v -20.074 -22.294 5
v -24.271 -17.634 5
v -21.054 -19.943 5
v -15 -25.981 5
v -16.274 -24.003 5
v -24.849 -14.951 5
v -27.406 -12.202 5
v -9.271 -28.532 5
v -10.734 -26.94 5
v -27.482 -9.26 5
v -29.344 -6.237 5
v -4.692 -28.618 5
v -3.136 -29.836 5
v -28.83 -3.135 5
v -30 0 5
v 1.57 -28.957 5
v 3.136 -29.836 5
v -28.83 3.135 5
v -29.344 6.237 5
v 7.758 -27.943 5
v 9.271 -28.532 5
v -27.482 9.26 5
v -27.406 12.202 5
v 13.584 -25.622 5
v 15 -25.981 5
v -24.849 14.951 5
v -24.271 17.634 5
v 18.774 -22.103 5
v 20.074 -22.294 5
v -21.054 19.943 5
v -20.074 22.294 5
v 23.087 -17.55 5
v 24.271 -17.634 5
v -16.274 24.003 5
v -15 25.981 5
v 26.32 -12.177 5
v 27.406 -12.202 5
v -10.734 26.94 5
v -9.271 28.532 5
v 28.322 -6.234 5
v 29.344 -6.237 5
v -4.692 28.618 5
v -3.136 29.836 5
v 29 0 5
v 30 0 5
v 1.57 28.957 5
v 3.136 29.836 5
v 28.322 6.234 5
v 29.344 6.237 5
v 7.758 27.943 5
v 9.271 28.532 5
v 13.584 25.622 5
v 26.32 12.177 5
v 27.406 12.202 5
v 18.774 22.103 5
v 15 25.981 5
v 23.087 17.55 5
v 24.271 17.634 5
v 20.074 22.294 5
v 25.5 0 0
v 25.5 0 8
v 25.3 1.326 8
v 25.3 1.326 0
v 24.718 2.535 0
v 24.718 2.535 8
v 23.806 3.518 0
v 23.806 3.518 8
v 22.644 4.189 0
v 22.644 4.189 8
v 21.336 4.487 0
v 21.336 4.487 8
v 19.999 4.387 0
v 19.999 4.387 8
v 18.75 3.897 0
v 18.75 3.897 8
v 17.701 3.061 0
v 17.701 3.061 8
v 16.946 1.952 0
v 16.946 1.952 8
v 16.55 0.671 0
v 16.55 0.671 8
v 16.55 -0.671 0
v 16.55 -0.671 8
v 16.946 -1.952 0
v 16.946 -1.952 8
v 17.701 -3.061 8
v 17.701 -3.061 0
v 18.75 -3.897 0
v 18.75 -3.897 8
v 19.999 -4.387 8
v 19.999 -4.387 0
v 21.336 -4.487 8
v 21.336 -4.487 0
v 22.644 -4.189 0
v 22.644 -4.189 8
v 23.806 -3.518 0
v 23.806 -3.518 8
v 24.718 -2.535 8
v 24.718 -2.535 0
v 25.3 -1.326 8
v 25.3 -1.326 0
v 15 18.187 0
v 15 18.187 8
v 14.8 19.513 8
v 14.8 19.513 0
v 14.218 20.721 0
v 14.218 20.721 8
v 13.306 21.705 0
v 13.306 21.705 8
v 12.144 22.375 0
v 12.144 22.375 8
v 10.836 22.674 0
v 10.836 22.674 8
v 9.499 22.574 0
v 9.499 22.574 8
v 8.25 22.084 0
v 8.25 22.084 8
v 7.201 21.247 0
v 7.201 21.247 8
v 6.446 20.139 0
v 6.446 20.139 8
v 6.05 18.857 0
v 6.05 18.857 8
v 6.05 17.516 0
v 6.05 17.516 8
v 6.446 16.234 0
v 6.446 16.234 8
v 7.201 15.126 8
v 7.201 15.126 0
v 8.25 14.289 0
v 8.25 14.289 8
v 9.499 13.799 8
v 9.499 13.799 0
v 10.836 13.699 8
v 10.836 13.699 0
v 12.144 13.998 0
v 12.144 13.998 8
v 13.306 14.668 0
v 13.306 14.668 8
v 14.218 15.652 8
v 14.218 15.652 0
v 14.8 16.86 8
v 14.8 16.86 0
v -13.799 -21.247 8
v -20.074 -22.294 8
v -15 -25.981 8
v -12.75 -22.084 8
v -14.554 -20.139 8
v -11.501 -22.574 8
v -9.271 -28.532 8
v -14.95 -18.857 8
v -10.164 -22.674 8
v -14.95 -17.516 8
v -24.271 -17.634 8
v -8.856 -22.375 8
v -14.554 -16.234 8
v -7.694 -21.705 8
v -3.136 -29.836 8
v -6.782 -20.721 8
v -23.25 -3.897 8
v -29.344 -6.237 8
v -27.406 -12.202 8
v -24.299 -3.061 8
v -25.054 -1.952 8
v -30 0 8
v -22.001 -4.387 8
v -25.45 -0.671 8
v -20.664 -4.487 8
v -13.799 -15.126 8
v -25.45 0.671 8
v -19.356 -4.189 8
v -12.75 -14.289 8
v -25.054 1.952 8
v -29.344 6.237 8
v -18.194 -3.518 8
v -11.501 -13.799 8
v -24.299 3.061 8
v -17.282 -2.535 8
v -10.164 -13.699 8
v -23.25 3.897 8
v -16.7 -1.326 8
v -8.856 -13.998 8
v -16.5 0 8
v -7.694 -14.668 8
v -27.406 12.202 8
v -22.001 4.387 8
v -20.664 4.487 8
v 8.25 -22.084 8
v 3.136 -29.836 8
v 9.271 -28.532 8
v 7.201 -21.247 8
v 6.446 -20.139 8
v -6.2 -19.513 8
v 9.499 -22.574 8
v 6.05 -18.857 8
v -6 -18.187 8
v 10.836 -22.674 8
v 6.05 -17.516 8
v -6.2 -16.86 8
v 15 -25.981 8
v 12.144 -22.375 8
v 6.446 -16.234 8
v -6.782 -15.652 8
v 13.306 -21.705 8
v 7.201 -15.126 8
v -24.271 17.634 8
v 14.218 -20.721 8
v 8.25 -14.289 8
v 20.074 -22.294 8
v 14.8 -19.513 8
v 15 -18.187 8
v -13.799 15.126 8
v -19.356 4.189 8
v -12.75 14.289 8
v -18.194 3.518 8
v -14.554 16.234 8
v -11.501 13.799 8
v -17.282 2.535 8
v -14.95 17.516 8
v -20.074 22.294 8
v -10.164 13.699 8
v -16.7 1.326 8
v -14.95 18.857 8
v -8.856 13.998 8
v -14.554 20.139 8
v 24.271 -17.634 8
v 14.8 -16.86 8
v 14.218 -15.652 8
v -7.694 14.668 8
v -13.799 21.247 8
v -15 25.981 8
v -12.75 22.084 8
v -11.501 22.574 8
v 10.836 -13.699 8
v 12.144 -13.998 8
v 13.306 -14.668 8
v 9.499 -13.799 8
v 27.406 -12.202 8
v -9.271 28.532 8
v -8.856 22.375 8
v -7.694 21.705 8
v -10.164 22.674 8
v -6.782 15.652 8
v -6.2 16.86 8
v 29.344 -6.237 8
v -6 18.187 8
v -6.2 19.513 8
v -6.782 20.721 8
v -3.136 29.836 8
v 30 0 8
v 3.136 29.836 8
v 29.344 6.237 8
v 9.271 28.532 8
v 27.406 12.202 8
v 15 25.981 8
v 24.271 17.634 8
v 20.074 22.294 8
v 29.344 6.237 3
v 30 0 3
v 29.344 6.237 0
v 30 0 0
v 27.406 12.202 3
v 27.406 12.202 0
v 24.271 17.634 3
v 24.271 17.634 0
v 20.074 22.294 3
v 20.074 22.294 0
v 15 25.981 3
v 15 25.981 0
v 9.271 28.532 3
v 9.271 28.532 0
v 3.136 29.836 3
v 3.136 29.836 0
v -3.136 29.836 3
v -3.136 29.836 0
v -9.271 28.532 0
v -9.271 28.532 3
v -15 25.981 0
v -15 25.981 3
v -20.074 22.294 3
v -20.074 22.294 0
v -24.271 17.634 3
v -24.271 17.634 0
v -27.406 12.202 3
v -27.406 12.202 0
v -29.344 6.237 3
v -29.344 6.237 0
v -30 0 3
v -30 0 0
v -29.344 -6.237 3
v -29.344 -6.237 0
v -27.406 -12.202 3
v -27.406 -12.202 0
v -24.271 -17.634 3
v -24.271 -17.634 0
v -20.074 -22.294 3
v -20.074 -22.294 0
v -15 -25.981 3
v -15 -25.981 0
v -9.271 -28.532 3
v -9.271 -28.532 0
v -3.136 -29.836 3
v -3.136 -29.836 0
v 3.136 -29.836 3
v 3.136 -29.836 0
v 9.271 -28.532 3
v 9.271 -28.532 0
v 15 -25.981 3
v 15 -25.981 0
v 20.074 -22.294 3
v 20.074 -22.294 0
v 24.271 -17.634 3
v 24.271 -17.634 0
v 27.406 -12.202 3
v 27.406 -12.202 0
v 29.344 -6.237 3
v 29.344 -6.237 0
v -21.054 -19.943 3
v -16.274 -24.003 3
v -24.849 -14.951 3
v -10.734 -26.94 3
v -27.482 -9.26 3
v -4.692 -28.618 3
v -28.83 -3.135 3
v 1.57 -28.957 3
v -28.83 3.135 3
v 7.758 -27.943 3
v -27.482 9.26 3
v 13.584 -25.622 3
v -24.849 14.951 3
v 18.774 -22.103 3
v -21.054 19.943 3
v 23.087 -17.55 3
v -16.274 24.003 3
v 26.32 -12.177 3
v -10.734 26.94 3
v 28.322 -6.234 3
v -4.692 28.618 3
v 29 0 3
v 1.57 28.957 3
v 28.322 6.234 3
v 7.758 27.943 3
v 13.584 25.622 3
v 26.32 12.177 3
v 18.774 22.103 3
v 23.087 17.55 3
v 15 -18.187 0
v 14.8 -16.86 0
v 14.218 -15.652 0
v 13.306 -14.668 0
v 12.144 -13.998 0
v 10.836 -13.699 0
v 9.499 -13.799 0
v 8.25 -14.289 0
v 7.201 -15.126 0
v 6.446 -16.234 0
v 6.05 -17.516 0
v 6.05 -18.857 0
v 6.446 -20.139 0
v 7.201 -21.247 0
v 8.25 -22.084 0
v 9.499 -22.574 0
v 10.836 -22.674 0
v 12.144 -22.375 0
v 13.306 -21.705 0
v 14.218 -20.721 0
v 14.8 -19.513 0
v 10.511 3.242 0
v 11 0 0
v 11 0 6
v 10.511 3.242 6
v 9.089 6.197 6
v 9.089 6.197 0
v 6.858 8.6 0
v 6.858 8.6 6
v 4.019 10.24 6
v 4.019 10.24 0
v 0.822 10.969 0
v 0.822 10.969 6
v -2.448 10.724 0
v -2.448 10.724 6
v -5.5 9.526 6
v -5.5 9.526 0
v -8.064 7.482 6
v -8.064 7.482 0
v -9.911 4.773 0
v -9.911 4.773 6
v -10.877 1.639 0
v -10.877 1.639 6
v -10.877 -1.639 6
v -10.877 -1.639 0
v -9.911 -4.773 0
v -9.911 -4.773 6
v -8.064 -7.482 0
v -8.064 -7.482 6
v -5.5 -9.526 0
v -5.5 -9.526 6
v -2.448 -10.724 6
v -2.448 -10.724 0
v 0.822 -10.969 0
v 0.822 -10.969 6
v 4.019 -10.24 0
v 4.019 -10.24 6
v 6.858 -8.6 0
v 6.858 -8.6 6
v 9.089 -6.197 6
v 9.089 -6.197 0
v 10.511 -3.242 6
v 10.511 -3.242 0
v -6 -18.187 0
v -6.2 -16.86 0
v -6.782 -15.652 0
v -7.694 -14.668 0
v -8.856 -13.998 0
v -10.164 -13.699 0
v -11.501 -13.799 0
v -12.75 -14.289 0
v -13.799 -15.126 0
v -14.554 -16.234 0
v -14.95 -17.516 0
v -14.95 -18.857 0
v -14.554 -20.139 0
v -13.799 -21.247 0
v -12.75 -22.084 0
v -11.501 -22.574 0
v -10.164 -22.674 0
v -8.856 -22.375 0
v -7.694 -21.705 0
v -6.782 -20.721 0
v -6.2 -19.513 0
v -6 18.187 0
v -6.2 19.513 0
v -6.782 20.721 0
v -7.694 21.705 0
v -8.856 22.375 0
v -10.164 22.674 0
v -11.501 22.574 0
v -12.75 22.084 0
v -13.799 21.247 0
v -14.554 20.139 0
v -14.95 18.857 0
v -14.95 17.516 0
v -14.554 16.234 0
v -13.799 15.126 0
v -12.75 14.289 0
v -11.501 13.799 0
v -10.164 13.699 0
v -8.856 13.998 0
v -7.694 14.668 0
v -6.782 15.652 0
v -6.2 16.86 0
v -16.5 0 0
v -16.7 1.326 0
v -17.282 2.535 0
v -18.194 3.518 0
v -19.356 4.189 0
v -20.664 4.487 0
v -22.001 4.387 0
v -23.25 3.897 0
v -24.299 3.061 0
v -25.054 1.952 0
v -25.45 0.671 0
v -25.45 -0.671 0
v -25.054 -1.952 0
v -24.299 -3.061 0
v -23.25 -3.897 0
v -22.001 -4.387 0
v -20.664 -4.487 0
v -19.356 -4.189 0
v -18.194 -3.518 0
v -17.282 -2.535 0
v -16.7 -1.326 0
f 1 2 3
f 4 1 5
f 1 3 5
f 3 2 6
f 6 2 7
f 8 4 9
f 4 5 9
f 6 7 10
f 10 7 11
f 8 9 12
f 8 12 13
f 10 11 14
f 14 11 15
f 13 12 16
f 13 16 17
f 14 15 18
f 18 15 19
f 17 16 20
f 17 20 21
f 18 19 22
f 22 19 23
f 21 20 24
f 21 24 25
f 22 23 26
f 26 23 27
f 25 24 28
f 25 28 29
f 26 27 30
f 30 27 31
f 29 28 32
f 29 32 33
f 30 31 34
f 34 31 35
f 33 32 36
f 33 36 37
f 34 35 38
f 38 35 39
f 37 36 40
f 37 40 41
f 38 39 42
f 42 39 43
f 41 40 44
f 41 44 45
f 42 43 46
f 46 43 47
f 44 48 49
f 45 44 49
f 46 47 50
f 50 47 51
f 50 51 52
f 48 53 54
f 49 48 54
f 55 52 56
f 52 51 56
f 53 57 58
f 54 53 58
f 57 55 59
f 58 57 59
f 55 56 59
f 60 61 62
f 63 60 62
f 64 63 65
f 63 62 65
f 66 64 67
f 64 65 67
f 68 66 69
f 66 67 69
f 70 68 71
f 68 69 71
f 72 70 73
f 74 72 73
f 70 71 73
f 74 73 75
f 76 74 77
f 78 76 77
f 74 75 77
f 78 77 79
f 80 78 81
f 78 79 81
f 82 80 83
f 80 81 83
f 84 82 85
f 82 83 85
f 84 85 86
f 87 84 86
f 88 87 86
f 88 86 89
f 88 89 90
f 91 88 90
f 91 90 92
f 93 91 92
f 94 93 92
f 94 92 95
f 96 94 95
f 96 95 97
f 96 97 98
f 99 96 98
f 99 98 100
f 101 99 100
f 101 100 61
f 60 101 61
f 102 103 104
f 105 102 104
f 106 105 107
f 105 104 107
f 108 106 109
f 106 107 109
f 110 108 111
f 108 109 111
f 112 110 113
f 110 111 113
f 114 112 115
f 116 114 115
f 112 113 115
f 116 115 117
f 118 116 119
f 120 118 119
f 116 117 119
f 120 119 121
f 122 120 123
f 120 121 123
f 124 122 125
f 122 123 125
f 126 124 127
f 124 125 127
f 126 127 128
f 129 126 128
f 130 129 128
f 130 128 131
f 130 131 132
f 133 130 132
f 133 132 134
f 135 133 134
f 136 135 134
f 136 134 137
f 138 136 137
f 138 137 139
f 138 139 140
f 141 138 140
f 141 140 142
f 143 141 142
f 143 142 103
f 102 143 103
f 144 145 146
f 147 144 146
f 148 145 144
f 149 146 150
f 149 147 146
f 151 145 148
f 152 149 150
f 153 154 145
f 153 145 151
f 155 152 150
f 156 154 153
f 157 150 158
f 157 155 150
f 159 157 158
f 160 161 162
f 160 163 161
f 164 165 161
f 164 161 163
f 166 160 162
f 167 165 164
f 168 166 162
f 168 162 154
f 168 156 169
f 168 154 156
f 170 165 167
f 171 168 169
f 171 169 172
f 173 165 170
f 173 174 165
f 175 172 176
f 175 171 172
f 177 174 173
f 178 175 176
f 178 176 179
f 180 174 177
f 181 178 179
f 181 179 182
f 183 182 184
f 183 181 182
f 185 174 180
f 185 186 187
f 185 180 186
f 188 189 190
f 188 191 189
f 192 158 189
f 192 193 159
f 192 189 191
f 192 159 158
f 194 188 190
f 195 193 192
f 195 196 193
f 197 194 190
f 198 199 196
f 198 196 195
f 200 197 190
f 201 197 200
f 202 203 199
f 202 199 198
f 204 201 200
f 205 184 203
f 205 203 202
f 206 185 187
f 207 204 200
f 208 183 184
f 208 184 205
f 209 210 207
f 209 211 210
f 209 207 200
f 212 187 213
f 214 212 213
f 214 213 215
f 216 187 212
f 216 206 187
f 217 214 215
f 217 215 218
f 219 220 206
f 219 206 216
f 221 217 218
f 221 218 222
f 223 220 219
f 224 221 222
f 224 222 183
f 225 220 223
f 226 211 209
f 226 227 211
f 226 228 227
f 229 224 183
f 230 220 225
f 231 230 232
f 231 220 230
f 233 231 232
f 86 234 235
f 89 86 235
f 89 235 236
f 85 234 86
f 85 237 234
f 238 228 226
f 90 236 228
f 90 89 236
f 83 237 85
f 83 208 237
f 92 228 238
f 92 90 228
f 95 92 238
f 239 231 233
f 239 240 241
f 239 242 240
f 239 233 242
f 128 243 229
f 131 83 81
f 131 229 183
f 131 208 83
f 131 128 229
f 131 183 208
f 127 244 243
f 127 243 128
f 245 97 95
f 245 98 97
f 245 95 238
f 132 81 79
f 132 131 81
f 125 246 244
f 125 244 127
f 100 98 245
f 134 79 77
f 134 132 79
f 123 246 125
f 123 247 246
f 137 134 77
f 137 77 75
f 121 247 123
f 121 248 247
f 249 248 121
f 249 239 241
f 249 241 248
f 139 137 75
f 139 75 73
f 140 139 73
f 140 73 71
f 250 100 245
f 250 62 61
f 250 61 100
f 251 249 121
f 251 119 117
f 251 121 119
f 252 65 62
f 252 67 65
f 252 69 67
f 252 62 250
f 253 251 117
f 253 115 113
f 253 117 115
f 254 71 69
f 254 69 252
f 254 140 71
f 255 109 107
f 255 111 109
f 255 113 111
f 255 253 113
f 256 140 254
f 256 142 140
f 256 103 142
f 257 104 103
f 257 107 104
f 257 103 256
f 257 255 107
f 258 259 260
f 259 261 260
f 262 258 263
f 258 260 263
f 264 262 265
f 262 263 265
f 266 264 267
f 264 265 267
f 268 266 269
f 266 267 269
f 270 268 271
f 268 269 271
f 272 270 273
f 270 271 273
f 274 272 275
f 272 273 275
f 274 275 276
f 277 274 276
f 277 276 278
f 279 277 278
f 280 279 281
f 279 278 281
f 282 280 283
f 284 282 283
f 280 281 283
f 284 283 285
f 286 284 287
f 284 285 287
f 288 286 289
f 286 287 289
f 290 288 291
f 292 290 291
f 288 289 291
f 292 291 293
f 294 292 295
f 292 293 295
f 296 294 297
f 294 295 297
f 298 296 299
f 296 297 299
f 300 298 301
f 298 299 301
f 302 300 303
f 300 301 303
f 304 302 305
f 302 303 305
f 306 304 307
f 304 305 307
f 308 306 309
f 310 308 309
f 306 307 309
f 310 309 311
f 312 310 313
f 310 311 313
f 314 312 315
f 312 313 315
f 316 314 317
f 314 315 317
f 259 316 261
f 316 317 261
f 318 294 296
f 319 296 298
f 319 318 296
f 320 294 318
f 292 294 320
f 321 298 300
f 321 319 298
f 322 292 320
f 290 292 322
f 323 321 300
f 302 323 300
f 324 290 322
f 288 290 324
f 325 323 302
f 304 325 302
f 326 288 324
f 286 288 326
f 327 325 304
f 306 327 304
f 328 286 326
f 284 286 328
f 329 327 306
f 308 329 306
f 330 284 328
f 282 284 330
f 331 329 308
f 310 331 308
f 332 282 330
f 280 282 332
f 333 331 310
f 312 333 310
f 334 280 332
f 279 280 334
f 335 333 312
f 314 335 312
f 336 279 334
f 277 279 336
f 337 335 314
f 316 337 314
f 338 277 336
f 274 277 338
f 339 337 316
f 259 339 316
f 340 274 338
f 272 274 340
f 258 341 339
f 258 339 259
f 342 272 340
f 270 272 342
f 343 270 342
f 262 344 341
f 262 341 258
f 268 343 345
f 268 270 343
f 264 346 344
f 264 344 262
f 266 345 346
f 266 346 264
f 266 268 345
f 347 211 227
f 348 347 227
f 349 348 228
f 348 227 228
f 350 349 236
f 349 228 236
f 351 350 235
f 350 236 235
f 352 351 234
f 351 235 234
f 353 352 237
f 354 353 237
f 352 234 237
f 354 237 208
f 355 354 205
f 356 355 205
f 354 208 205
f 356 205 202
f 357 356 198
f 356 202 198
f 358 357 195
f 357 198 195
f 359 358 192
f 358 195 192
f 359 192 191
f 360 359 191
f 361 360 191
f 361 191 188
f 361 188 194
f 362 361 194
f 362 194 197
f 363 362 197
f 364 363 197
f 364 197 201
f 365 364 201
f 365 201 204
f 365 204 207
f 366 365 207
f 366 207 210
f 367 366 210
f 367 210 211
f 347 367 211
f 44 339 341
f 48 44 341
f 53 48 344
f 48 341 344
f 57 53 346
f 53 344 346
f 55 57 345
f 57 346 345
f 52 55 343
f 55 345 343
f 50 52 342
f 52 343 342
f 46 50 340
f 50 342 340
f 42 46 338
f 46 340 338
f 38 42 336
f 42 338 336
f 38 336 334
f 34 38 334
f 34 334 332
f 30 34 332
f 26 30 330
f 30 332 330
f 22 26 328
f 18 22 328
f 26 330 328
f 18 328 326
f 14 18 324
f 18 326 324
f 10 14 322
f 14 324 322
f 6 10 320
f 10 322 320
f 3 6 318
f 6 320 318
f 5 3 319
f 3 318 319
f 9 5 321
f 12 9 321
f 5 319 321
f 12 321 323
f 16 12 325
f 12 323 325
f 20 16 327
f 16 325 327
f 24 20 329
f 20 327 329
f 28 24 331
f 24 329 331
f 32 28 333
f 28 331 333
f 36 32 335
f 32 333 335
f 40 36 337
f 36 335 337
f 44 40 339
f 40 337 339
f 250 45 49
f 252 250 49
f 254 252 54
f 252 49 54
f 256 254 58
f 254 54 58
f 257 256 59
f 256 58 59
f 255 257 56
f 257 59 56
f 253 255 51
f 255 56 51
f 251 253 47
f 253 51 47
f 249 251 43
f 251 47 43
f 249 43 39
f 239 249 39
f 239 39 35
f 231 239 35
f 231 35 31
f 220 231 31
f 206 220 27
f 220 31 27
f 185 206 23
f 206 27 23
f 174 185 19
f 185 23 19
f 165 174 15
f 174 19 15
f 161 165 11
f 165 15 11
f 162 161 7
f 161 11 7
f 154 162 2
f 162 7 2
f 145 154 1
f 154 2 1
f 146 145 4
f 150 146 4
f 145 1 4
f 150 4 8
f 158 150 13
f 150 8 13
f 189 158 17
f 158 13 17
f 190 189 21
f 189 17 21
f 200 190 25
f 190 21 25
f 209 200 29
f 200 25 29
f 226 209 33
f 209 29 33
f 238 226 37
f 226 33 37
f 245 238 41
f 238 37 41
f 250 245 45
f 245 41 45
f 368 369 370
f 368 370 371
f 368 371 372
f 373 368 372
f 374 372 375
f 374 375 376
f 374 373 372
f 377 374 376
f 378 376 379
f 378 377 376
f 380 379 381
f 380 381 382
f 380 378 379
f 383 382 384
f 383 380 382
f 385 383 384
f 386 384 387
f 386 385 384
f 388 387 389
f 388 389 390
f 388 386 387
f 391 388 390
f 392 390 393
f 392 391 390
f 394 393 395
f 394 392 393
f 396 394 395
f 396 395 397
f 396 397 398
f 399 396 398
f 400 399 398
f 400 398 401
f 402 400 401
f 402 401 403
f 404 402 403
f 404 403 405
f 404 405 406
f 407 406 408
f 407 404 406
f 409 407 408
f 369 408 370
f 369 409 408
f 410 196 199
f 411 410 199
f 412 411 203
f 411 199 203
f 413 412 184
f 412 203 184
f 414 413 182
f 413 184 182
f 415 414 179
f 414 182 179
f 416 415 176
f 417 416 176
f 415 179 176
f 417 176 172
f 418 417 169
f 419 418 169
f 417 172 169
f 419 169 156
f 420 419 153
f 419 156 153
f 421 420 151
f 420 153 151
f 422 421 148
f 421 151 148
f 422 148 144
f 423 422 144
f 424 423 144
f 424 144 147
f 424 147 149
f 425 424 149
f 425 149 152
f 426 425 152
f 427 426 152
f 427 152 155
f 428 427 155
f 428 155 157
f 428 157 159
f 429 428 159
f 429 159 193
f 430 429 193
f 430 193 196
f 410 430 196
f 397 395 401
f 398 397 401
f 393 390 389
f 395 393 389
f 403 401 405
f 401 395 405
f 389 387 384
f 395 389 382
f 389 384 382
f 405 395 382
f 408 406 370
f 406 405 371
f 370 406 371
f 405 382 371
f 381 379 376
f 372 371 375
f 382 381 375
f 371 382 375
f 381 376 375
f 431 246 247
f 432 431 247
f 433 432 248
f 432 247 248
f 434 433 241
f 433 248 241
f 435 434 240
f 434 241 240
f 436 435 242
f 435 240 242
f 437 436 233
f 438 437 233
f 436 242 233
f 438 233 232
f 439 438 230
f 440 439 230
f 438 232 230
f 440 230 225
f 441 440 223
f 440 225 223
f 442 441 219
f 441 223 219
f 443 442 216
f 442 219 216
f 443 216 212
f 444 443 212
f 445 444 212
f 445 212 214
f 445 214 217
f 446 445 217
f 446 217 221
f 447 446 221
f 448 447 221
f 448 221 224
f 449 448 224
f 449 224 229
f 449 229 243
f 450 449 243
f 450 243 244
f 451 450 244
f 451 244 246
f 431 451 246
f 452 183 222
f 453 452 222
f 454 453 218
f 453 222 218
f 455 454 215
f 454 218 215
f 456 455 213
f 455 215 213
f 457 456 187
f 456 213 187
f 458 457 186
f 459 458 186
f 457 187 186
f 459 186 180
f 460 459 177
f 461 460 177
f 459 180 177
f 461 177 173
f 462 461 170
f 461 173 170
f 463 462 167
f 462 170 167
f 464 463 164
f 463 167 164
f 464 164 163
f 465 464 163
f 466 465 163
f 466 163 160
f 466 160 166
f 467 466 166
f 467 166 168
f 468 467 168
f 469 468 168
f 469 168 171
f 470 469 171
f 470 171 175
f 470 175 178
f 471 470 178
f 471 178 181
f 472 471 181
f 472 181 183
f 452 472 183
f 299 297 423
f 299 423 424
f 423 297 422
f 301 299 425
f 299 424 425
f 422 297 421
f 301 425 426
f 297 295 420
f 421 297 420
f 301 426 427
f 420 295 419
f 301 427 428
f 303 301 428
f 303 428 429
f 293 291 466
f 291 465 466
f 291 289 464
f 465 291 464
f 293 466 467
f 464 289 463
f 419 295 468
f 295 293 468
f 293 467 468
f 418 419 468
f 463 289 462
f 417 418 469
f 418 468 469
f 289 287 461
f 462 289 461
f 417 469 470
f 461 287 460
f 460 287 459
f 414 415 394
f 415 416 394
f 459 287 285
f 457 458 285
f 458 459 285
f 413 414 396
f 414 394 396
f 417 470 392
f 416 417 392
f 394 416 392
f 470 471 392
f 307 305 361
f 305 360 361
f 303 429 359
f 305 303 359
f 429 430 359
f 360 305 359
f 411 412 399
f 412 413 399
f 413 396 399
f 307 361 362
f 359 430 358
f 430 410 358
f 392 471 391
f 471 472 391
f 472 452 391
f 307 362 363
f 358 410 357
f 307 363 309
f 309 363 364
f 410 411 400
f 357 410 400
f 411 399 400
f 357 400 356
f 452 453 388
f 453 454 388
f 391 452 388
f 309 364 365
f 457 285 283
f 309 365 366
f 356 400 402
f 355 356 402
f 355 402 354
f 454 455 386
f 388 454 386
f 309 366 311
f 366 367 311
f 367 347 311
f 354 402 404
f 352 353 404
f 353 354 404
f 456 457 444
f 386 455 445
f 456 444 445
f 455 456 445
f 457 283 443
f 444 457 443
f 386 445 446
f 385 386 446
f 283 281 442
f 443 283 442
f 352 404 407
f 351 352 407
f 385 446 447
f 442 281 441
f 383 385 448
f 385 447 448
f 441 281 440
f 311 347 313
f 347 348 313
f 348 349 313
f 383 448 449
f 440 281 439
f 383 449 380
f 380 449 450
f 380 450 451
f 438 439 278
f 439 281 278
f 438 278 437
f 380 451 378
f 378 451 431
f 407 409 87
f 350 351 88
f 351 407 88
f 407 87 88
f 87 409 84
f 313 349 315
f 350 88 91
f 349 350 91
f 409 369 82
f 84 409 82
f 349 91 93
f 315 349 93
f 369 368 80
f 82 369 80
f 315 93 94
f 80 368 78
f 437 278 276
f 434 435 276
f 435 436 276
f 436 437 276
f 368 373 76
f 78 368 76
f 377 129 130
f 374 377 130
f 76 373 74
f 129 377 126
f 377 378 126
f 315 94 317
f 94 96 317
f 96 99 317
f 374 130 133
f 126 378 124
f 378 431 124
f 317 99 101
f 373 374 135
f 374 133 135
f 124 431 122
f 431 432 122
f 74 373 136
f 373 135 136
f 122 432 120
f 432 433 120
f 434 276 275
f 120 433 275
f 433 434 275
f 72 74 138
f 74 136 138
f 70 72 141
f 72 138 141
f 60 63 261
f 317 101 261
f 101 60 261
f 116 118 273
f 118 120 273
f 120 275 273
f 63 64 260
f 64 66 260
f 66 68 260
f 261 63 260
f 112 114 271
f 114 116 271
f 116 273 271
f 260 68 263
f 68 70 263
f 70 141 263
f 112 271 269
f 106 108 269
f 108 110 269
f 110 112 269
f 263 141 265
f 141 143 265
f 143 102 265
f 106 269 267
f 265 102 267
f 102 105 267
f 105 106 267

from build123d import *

# Parameters (mm, degrees)
ESQUISSE1_R                  = 30
ESQUISSE1_R_2                = 11
BOSS_EXTRU_1_DEPTH           = 6
ESQUISSE2_R                  = 30
BOSS_EXTRU_2_DEPTH           = 2
ENL_V_MAT_EXTRU_1_DEPTH      = 1
ENL_V_MAT_EXTRU_1_DEPTH_BACK = 1
ESQUISSE3_R                  = 30
ESQUISSE3_R_2                = 29
ESQUISSE4_R                  = 4.5
AJOURAGE_DEPTH               = 44.17406629


with BuildPart() as part:
    # Esquisse1 → Boss.-Extru.1 (new body)
    with BuildSketch(Plane.XY):
        Circle(ESQUISSE1_R)
        Circle(ESQUISSE1_R_2, mode=Mode.SUBTRACT)
    extrude(amount=BOSS_EXTRU_1_DEPTH)

    # Esquisse2 → Boss.-Extru.2 (add)
    with BuildSketch(Plane.XY.offset(6)):
        Circle(ESQUISSE2_R)
    extrude(amount=BOSS_EXTRU_2_DEPTH)

    # Esquisse3 → Enlèv. mat.-Extru.1 (cut, two sides: drawn at the far end of the back side and taken through both)
    with BuildSketch(Plane.XY.offset(4).offset(-ENL_V_MAT_EXTRU_1_DEPTH_BACK)):
        Circle(ESQUISSE3_R)
        Circle(ESQUISSE3_R_2, mode=Mode.SUBTRACT)
    extrude(amount=ENL_V_MAT_EXTRU_1_DEPTH + ENL_V_MAT_EXTRU_1_DEPTH_BACK, mode=Mode.SUBTRACT)

    # Esquisse4 → Ajourage (cut, through all)
    with BuildSketch(Plane.XY.offset(8)):
        with Locations((21, 0)):
            Circle(ESQUISSE4_R)
        with Locations((10.5, 18.186533479)):
            Circle(ESQUISSE4_R)
        with Locations((-10.5, 18.186533479)):
            Circle(ESQUISSE4_R)
        with Locations((-21, 0)):
            Circle(ESQUISSE4_R)
        with Locations((-10.5, -18.186533479)):
            Circle(ESQUISSE4_R)
        with Locations((10.5, -18.186533479)):
            Circle(ESQUISSE4_R)
    extrude(amount=-AJOURAGE_DEPTH, mode=Mode.SUBTRACT)


solid = part.part
